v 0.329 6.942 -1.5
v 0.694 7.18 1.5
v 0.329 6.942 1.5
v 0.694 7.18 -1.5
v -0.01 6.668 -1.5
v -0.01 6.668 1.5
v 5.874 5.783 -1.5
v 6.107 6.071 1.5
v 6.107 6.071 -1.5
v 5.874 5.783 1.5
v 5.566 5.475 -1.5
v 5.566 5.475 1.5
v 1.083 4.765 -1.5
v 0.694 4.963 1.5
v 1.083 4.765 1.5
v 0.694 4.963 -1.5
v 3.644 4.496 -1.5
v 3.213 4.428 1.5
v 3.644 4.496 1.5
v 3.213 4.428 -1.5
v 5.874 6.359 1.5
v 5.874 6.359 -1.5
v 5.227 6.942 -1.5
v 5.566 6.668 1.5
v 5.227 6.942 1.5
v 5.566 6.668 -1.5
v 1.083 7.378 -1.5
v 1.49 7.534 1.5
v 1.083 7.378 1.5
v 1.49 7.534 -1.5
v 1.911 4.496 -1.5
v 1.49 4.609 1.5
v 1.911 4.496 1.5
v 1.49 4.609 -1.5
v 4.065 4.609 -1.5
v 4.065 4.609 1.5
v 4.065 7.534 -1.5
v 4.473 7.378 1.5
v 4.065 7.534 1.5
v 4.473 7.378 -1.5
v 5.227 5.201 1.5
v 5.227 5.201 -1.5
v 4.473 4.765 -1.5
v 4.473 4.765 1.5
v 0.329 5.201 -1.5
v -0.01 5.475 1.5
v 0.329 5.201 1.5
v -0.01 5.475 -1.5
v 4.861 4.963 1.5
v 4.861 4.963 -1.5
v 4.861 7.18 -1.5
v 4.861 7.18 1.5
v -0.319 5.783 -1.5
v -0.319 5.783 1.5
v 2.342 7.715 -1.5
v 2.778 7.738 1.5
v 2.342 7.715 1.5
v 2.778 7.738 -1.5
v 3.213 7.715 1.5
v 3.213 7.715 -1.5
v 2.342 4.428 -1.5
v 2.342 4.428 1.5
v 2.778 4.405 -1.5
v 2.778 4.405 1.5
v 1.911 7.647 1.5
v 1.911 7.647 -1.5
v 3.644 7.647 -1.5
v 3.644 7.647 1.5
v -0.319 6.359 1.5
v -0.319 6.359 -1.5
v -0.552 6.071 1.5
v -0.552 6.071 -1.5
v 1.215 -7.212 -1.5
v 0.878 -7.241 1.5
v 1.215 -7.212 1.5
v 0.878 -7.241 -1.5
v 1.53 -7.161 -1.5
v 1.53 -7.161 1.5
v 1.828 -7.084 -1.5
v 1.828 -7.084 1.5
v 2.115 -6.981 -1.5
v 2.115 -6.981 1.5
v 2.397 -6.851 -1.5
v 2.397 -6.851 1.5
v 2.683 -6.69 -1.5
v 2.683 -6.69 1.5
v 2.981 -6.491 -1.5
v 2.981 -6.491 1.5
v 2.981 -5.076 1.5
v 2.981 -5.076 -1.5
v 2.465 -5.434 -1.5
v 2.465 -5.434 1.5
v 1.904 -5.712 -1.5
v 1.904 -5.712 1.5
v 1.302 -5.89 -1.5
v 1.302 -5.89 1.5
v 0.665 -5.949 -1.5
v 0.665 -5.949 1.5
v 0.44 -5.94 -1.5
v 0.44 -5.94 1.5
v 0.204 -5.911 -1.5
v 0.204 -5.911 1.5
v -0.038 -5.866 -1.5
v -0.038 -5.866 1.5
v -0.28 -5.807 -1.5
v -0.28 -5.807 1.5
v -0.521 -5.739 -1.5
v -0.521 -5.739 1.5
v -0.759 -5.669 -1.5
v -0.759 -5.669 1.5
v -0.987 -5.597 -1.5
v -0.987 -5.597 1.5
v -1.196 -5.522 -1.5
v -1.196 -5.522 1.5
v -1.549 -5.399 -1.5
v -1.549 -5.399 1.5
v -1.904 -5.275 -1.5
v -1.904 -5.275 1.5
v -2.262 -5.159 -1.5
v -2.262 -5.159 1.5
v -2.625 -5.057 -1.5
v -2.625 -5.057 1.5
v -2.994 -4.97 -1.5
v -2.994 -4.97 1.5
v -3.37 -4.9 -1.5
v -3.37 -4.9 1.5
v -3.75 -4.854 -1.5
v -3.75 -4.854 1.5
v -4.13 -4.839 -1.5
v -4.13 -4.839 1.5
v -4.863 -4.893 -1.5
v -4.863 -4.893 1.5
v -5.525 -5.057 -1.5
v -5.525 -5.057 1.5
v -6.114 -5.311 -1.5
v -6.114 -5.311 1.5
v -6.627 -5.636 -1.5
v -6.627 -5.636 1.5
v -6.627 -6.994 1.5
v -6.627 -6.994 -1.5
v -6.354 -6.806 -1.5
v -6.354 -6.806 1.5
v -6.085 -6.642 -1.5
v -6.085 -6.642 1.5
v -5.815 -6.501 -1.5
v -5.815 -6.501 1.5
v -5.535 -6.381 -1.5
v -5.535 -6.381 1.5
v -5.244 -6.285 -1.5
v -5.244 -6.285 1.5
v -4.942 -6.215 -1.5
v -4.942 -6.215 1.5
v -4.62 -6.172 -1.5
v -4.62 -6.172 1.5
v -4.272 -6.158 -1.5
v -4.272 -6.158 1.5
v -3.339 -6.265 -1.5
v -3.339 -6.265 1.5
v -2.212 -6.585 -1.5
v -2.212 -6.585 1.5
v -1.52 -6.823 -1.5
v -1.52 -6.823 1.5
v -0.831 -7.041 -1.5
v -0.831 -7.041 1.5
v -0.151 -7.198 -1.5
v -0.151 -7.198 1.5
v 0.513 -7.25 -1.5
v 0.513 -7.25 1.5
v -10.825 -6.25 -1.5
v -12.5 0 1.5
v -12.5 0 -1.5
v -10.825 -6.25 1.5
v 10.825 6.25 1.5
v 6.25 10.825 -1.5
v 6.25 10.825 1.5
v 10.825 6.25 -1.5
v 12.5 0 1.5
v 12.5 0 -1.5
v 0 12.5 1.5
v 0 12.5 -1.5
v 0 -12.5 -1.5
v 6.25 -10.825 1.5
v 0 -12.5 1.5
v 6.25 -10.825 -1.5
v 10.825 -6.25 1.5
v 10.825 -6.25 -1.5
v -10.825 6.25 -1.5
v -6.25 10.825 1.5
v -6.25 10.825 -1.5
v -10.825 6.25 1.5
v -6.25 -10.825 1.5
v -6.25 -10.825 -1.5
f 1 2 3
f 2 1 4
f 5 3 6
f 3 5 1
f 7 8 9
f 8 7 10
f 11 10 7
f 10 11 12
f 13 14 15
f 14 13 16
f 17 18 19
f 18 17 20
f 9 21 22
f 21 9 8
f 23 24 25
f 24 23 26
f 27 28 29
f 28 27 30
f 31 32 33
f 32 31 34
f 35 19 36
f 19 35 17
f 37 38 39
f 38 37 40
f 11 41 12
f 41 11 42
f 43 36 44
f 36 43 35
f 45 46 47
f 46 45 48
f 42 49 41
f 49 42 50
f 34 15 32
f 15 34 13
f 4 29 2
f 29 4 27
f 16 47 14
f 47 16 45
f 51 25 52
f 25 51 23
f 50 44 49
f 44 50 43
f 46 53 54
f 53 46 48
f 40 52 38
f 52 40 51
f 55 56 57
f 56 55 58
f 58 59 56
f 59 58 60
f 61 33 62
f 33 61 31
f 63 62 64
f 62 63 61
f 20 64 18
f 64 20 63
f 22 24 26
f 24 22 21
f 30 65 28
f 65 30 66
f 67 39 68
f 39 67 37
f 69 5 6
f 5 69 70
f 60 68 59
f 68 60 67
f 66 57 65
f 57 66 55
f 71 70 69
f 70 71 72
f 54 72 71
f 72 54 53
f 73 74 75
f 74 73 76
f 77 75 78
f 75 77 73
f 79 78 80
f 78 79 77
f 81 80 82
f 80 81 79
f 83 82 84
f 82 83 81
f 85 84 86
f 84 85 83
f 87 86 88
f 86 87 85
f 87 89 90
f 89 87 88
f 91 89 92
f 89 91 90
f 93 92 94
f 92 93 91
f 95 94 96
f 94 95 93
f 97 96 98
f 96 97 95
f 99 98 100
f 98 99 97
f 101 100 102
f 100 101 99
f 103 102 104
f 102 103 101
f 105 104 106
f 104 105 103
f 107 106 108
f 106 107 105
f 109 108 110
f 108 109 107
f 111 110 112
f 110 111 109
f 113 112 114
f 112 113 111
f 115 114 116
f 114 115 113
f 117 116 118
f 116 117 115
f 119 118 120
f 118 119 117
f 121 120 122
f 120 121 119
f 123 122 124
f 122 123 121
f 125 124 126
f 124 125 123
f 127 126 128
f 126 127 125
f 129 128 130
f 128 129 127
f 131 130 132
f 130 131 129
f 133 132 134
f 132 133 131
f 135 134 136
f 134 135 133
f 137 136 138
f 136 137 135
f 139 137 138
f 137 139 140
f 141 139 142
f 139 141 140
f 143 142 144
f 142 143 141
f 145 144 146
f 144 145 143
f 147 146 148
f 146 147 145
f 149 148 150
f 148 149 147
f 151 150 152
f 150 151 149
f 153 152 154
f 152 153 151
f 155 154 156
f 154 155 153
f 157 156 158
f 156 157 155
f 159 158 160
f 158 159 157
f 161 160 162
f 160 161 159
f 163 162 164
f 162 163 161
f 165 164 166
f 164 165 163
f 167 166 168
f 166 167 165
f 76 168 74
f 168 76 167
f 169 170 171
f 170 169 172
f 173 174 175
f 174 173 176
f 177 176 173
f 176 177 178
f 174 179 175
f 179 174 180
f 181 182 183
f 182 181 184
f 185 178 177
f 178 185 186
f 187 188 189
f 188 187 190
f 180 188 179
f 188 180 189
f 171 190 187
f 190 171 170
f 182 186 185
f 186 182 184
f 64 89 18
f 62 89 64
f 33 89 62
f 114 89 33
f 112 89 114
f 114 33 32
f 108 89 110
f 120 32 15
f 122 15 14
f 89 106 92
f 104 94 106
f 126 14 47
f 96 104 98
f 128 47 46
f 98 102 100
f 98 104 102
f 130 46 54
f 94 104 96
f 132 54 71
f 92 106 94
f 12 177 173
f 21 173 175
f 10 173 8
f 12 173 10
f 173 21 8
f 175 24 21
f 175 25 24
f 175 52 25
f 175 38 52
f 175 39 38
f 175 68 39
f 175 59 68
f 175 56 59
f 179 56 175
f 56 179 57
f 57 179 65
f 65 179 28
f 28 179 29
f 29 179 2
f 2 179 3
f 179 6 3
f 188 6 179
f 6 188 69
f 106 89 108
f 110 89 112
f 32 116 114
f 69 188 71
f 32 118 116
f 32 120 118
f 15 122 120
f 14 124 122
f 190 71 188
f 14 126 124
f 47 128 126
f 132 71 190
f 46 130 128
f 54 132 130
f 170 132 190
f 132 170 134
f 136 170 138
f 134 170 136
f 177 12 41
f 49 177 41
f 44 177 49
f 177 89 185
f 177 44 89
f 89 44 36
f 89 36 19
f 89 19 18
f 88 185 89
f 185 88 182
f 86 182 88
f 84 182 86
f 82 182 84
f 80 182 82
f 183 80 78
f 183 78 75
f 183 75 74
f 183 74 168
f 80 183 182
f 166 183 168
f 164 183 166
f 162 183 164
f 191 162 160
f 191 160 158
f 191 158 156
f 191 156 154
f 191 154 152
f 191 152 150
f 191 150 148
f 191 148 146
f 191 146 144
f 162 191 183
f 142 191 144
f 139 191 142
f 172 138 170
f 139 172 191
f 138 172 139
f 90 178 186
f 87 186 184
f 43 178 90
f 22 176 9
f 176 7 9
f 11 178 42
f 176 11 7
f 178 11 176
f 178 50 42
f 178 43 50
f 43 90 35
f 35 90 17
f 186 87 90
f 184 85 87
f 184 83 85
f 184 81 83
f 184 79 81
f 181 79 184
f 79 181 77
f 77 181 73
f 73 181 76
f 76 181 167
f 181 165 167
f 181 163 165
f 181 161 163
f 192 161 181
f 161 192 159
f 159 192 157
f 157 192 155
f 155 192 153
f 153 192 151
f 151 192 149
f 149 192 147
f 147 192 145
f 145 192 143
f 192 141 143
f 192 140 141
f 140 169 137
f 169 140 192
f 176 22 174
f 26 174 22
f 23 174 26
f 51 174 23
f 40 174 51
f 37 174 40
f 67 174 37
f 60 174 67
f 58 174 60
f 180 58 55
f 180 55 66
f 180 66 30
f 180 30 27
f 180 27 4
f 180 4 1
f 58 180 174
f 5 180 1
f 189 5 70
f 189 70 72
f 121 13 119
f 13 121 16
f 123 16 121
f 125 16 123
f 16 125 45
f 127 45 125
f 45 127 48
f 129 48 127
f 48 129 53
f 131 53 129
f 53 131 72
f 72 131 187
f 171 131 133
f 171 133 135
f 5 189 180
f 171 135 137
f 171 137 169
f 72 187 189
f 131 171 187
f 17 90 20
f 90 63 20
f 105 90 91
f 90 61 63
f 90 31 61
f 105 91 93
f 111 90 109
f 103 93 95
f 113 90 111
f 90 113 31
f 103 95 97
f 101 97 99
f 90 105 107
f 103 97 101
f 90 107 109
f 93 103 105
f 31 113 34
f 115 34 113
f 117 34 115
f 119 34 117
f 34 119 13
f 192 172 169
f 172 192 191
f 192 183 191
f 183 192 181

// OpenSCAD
$fn=12;

// unit is mm

diameter = 25;
thickness = 3;
slit_width = 0.8;
arrow_base = 7;

ab_2 = arrow_base / 2;
ab_7 = arrow_base / 7;
thickness12 = 1.2 * thickness;
diameter_2 = diameter / 2;
fs = 0.4 * arrow_base; // feather side
fs2 = 2 * fs;


module half_lens(diameter, shift) {
  difference() {
    circle(d=diameter, $fn=60);
    translate([ 0, -shift, 0 ]) square(diameter, center=true);
  }
}
module lens(diameter, factor) {
  union() {
    half_lens(diameter, factor * diameter);
    translate([ 0, diameter - 2 * factor * diameter, 0 ])
      rotate([ 0, 0, 180 ])
        half_lens(diameter, factor * diameter);
  }
}

//translate([ diameter, diameter, diameter ])
//  half_lens(diameter, 0.2 * diameter);
//translate([ diameter, diameter, 0 ])
//  lens(diameter, 0.2);


difference() {

  union() {

    cylinder(d=diameter, h=thickness, center=true);
  }

  union() {

    translate([ diameter / 9, diameter / 7, - 0.5 * thickness12 ])
      linear_extrude(thickness12)
        lens(diameter / 3, 0.2); // bullet
    translate([ -0.6 * diameter_2, -1.0 * diameter_2, -0.5 * thickness12 ])
      linear_extrude(thickness12)
        text("~", size=14); // sling
  }
}
